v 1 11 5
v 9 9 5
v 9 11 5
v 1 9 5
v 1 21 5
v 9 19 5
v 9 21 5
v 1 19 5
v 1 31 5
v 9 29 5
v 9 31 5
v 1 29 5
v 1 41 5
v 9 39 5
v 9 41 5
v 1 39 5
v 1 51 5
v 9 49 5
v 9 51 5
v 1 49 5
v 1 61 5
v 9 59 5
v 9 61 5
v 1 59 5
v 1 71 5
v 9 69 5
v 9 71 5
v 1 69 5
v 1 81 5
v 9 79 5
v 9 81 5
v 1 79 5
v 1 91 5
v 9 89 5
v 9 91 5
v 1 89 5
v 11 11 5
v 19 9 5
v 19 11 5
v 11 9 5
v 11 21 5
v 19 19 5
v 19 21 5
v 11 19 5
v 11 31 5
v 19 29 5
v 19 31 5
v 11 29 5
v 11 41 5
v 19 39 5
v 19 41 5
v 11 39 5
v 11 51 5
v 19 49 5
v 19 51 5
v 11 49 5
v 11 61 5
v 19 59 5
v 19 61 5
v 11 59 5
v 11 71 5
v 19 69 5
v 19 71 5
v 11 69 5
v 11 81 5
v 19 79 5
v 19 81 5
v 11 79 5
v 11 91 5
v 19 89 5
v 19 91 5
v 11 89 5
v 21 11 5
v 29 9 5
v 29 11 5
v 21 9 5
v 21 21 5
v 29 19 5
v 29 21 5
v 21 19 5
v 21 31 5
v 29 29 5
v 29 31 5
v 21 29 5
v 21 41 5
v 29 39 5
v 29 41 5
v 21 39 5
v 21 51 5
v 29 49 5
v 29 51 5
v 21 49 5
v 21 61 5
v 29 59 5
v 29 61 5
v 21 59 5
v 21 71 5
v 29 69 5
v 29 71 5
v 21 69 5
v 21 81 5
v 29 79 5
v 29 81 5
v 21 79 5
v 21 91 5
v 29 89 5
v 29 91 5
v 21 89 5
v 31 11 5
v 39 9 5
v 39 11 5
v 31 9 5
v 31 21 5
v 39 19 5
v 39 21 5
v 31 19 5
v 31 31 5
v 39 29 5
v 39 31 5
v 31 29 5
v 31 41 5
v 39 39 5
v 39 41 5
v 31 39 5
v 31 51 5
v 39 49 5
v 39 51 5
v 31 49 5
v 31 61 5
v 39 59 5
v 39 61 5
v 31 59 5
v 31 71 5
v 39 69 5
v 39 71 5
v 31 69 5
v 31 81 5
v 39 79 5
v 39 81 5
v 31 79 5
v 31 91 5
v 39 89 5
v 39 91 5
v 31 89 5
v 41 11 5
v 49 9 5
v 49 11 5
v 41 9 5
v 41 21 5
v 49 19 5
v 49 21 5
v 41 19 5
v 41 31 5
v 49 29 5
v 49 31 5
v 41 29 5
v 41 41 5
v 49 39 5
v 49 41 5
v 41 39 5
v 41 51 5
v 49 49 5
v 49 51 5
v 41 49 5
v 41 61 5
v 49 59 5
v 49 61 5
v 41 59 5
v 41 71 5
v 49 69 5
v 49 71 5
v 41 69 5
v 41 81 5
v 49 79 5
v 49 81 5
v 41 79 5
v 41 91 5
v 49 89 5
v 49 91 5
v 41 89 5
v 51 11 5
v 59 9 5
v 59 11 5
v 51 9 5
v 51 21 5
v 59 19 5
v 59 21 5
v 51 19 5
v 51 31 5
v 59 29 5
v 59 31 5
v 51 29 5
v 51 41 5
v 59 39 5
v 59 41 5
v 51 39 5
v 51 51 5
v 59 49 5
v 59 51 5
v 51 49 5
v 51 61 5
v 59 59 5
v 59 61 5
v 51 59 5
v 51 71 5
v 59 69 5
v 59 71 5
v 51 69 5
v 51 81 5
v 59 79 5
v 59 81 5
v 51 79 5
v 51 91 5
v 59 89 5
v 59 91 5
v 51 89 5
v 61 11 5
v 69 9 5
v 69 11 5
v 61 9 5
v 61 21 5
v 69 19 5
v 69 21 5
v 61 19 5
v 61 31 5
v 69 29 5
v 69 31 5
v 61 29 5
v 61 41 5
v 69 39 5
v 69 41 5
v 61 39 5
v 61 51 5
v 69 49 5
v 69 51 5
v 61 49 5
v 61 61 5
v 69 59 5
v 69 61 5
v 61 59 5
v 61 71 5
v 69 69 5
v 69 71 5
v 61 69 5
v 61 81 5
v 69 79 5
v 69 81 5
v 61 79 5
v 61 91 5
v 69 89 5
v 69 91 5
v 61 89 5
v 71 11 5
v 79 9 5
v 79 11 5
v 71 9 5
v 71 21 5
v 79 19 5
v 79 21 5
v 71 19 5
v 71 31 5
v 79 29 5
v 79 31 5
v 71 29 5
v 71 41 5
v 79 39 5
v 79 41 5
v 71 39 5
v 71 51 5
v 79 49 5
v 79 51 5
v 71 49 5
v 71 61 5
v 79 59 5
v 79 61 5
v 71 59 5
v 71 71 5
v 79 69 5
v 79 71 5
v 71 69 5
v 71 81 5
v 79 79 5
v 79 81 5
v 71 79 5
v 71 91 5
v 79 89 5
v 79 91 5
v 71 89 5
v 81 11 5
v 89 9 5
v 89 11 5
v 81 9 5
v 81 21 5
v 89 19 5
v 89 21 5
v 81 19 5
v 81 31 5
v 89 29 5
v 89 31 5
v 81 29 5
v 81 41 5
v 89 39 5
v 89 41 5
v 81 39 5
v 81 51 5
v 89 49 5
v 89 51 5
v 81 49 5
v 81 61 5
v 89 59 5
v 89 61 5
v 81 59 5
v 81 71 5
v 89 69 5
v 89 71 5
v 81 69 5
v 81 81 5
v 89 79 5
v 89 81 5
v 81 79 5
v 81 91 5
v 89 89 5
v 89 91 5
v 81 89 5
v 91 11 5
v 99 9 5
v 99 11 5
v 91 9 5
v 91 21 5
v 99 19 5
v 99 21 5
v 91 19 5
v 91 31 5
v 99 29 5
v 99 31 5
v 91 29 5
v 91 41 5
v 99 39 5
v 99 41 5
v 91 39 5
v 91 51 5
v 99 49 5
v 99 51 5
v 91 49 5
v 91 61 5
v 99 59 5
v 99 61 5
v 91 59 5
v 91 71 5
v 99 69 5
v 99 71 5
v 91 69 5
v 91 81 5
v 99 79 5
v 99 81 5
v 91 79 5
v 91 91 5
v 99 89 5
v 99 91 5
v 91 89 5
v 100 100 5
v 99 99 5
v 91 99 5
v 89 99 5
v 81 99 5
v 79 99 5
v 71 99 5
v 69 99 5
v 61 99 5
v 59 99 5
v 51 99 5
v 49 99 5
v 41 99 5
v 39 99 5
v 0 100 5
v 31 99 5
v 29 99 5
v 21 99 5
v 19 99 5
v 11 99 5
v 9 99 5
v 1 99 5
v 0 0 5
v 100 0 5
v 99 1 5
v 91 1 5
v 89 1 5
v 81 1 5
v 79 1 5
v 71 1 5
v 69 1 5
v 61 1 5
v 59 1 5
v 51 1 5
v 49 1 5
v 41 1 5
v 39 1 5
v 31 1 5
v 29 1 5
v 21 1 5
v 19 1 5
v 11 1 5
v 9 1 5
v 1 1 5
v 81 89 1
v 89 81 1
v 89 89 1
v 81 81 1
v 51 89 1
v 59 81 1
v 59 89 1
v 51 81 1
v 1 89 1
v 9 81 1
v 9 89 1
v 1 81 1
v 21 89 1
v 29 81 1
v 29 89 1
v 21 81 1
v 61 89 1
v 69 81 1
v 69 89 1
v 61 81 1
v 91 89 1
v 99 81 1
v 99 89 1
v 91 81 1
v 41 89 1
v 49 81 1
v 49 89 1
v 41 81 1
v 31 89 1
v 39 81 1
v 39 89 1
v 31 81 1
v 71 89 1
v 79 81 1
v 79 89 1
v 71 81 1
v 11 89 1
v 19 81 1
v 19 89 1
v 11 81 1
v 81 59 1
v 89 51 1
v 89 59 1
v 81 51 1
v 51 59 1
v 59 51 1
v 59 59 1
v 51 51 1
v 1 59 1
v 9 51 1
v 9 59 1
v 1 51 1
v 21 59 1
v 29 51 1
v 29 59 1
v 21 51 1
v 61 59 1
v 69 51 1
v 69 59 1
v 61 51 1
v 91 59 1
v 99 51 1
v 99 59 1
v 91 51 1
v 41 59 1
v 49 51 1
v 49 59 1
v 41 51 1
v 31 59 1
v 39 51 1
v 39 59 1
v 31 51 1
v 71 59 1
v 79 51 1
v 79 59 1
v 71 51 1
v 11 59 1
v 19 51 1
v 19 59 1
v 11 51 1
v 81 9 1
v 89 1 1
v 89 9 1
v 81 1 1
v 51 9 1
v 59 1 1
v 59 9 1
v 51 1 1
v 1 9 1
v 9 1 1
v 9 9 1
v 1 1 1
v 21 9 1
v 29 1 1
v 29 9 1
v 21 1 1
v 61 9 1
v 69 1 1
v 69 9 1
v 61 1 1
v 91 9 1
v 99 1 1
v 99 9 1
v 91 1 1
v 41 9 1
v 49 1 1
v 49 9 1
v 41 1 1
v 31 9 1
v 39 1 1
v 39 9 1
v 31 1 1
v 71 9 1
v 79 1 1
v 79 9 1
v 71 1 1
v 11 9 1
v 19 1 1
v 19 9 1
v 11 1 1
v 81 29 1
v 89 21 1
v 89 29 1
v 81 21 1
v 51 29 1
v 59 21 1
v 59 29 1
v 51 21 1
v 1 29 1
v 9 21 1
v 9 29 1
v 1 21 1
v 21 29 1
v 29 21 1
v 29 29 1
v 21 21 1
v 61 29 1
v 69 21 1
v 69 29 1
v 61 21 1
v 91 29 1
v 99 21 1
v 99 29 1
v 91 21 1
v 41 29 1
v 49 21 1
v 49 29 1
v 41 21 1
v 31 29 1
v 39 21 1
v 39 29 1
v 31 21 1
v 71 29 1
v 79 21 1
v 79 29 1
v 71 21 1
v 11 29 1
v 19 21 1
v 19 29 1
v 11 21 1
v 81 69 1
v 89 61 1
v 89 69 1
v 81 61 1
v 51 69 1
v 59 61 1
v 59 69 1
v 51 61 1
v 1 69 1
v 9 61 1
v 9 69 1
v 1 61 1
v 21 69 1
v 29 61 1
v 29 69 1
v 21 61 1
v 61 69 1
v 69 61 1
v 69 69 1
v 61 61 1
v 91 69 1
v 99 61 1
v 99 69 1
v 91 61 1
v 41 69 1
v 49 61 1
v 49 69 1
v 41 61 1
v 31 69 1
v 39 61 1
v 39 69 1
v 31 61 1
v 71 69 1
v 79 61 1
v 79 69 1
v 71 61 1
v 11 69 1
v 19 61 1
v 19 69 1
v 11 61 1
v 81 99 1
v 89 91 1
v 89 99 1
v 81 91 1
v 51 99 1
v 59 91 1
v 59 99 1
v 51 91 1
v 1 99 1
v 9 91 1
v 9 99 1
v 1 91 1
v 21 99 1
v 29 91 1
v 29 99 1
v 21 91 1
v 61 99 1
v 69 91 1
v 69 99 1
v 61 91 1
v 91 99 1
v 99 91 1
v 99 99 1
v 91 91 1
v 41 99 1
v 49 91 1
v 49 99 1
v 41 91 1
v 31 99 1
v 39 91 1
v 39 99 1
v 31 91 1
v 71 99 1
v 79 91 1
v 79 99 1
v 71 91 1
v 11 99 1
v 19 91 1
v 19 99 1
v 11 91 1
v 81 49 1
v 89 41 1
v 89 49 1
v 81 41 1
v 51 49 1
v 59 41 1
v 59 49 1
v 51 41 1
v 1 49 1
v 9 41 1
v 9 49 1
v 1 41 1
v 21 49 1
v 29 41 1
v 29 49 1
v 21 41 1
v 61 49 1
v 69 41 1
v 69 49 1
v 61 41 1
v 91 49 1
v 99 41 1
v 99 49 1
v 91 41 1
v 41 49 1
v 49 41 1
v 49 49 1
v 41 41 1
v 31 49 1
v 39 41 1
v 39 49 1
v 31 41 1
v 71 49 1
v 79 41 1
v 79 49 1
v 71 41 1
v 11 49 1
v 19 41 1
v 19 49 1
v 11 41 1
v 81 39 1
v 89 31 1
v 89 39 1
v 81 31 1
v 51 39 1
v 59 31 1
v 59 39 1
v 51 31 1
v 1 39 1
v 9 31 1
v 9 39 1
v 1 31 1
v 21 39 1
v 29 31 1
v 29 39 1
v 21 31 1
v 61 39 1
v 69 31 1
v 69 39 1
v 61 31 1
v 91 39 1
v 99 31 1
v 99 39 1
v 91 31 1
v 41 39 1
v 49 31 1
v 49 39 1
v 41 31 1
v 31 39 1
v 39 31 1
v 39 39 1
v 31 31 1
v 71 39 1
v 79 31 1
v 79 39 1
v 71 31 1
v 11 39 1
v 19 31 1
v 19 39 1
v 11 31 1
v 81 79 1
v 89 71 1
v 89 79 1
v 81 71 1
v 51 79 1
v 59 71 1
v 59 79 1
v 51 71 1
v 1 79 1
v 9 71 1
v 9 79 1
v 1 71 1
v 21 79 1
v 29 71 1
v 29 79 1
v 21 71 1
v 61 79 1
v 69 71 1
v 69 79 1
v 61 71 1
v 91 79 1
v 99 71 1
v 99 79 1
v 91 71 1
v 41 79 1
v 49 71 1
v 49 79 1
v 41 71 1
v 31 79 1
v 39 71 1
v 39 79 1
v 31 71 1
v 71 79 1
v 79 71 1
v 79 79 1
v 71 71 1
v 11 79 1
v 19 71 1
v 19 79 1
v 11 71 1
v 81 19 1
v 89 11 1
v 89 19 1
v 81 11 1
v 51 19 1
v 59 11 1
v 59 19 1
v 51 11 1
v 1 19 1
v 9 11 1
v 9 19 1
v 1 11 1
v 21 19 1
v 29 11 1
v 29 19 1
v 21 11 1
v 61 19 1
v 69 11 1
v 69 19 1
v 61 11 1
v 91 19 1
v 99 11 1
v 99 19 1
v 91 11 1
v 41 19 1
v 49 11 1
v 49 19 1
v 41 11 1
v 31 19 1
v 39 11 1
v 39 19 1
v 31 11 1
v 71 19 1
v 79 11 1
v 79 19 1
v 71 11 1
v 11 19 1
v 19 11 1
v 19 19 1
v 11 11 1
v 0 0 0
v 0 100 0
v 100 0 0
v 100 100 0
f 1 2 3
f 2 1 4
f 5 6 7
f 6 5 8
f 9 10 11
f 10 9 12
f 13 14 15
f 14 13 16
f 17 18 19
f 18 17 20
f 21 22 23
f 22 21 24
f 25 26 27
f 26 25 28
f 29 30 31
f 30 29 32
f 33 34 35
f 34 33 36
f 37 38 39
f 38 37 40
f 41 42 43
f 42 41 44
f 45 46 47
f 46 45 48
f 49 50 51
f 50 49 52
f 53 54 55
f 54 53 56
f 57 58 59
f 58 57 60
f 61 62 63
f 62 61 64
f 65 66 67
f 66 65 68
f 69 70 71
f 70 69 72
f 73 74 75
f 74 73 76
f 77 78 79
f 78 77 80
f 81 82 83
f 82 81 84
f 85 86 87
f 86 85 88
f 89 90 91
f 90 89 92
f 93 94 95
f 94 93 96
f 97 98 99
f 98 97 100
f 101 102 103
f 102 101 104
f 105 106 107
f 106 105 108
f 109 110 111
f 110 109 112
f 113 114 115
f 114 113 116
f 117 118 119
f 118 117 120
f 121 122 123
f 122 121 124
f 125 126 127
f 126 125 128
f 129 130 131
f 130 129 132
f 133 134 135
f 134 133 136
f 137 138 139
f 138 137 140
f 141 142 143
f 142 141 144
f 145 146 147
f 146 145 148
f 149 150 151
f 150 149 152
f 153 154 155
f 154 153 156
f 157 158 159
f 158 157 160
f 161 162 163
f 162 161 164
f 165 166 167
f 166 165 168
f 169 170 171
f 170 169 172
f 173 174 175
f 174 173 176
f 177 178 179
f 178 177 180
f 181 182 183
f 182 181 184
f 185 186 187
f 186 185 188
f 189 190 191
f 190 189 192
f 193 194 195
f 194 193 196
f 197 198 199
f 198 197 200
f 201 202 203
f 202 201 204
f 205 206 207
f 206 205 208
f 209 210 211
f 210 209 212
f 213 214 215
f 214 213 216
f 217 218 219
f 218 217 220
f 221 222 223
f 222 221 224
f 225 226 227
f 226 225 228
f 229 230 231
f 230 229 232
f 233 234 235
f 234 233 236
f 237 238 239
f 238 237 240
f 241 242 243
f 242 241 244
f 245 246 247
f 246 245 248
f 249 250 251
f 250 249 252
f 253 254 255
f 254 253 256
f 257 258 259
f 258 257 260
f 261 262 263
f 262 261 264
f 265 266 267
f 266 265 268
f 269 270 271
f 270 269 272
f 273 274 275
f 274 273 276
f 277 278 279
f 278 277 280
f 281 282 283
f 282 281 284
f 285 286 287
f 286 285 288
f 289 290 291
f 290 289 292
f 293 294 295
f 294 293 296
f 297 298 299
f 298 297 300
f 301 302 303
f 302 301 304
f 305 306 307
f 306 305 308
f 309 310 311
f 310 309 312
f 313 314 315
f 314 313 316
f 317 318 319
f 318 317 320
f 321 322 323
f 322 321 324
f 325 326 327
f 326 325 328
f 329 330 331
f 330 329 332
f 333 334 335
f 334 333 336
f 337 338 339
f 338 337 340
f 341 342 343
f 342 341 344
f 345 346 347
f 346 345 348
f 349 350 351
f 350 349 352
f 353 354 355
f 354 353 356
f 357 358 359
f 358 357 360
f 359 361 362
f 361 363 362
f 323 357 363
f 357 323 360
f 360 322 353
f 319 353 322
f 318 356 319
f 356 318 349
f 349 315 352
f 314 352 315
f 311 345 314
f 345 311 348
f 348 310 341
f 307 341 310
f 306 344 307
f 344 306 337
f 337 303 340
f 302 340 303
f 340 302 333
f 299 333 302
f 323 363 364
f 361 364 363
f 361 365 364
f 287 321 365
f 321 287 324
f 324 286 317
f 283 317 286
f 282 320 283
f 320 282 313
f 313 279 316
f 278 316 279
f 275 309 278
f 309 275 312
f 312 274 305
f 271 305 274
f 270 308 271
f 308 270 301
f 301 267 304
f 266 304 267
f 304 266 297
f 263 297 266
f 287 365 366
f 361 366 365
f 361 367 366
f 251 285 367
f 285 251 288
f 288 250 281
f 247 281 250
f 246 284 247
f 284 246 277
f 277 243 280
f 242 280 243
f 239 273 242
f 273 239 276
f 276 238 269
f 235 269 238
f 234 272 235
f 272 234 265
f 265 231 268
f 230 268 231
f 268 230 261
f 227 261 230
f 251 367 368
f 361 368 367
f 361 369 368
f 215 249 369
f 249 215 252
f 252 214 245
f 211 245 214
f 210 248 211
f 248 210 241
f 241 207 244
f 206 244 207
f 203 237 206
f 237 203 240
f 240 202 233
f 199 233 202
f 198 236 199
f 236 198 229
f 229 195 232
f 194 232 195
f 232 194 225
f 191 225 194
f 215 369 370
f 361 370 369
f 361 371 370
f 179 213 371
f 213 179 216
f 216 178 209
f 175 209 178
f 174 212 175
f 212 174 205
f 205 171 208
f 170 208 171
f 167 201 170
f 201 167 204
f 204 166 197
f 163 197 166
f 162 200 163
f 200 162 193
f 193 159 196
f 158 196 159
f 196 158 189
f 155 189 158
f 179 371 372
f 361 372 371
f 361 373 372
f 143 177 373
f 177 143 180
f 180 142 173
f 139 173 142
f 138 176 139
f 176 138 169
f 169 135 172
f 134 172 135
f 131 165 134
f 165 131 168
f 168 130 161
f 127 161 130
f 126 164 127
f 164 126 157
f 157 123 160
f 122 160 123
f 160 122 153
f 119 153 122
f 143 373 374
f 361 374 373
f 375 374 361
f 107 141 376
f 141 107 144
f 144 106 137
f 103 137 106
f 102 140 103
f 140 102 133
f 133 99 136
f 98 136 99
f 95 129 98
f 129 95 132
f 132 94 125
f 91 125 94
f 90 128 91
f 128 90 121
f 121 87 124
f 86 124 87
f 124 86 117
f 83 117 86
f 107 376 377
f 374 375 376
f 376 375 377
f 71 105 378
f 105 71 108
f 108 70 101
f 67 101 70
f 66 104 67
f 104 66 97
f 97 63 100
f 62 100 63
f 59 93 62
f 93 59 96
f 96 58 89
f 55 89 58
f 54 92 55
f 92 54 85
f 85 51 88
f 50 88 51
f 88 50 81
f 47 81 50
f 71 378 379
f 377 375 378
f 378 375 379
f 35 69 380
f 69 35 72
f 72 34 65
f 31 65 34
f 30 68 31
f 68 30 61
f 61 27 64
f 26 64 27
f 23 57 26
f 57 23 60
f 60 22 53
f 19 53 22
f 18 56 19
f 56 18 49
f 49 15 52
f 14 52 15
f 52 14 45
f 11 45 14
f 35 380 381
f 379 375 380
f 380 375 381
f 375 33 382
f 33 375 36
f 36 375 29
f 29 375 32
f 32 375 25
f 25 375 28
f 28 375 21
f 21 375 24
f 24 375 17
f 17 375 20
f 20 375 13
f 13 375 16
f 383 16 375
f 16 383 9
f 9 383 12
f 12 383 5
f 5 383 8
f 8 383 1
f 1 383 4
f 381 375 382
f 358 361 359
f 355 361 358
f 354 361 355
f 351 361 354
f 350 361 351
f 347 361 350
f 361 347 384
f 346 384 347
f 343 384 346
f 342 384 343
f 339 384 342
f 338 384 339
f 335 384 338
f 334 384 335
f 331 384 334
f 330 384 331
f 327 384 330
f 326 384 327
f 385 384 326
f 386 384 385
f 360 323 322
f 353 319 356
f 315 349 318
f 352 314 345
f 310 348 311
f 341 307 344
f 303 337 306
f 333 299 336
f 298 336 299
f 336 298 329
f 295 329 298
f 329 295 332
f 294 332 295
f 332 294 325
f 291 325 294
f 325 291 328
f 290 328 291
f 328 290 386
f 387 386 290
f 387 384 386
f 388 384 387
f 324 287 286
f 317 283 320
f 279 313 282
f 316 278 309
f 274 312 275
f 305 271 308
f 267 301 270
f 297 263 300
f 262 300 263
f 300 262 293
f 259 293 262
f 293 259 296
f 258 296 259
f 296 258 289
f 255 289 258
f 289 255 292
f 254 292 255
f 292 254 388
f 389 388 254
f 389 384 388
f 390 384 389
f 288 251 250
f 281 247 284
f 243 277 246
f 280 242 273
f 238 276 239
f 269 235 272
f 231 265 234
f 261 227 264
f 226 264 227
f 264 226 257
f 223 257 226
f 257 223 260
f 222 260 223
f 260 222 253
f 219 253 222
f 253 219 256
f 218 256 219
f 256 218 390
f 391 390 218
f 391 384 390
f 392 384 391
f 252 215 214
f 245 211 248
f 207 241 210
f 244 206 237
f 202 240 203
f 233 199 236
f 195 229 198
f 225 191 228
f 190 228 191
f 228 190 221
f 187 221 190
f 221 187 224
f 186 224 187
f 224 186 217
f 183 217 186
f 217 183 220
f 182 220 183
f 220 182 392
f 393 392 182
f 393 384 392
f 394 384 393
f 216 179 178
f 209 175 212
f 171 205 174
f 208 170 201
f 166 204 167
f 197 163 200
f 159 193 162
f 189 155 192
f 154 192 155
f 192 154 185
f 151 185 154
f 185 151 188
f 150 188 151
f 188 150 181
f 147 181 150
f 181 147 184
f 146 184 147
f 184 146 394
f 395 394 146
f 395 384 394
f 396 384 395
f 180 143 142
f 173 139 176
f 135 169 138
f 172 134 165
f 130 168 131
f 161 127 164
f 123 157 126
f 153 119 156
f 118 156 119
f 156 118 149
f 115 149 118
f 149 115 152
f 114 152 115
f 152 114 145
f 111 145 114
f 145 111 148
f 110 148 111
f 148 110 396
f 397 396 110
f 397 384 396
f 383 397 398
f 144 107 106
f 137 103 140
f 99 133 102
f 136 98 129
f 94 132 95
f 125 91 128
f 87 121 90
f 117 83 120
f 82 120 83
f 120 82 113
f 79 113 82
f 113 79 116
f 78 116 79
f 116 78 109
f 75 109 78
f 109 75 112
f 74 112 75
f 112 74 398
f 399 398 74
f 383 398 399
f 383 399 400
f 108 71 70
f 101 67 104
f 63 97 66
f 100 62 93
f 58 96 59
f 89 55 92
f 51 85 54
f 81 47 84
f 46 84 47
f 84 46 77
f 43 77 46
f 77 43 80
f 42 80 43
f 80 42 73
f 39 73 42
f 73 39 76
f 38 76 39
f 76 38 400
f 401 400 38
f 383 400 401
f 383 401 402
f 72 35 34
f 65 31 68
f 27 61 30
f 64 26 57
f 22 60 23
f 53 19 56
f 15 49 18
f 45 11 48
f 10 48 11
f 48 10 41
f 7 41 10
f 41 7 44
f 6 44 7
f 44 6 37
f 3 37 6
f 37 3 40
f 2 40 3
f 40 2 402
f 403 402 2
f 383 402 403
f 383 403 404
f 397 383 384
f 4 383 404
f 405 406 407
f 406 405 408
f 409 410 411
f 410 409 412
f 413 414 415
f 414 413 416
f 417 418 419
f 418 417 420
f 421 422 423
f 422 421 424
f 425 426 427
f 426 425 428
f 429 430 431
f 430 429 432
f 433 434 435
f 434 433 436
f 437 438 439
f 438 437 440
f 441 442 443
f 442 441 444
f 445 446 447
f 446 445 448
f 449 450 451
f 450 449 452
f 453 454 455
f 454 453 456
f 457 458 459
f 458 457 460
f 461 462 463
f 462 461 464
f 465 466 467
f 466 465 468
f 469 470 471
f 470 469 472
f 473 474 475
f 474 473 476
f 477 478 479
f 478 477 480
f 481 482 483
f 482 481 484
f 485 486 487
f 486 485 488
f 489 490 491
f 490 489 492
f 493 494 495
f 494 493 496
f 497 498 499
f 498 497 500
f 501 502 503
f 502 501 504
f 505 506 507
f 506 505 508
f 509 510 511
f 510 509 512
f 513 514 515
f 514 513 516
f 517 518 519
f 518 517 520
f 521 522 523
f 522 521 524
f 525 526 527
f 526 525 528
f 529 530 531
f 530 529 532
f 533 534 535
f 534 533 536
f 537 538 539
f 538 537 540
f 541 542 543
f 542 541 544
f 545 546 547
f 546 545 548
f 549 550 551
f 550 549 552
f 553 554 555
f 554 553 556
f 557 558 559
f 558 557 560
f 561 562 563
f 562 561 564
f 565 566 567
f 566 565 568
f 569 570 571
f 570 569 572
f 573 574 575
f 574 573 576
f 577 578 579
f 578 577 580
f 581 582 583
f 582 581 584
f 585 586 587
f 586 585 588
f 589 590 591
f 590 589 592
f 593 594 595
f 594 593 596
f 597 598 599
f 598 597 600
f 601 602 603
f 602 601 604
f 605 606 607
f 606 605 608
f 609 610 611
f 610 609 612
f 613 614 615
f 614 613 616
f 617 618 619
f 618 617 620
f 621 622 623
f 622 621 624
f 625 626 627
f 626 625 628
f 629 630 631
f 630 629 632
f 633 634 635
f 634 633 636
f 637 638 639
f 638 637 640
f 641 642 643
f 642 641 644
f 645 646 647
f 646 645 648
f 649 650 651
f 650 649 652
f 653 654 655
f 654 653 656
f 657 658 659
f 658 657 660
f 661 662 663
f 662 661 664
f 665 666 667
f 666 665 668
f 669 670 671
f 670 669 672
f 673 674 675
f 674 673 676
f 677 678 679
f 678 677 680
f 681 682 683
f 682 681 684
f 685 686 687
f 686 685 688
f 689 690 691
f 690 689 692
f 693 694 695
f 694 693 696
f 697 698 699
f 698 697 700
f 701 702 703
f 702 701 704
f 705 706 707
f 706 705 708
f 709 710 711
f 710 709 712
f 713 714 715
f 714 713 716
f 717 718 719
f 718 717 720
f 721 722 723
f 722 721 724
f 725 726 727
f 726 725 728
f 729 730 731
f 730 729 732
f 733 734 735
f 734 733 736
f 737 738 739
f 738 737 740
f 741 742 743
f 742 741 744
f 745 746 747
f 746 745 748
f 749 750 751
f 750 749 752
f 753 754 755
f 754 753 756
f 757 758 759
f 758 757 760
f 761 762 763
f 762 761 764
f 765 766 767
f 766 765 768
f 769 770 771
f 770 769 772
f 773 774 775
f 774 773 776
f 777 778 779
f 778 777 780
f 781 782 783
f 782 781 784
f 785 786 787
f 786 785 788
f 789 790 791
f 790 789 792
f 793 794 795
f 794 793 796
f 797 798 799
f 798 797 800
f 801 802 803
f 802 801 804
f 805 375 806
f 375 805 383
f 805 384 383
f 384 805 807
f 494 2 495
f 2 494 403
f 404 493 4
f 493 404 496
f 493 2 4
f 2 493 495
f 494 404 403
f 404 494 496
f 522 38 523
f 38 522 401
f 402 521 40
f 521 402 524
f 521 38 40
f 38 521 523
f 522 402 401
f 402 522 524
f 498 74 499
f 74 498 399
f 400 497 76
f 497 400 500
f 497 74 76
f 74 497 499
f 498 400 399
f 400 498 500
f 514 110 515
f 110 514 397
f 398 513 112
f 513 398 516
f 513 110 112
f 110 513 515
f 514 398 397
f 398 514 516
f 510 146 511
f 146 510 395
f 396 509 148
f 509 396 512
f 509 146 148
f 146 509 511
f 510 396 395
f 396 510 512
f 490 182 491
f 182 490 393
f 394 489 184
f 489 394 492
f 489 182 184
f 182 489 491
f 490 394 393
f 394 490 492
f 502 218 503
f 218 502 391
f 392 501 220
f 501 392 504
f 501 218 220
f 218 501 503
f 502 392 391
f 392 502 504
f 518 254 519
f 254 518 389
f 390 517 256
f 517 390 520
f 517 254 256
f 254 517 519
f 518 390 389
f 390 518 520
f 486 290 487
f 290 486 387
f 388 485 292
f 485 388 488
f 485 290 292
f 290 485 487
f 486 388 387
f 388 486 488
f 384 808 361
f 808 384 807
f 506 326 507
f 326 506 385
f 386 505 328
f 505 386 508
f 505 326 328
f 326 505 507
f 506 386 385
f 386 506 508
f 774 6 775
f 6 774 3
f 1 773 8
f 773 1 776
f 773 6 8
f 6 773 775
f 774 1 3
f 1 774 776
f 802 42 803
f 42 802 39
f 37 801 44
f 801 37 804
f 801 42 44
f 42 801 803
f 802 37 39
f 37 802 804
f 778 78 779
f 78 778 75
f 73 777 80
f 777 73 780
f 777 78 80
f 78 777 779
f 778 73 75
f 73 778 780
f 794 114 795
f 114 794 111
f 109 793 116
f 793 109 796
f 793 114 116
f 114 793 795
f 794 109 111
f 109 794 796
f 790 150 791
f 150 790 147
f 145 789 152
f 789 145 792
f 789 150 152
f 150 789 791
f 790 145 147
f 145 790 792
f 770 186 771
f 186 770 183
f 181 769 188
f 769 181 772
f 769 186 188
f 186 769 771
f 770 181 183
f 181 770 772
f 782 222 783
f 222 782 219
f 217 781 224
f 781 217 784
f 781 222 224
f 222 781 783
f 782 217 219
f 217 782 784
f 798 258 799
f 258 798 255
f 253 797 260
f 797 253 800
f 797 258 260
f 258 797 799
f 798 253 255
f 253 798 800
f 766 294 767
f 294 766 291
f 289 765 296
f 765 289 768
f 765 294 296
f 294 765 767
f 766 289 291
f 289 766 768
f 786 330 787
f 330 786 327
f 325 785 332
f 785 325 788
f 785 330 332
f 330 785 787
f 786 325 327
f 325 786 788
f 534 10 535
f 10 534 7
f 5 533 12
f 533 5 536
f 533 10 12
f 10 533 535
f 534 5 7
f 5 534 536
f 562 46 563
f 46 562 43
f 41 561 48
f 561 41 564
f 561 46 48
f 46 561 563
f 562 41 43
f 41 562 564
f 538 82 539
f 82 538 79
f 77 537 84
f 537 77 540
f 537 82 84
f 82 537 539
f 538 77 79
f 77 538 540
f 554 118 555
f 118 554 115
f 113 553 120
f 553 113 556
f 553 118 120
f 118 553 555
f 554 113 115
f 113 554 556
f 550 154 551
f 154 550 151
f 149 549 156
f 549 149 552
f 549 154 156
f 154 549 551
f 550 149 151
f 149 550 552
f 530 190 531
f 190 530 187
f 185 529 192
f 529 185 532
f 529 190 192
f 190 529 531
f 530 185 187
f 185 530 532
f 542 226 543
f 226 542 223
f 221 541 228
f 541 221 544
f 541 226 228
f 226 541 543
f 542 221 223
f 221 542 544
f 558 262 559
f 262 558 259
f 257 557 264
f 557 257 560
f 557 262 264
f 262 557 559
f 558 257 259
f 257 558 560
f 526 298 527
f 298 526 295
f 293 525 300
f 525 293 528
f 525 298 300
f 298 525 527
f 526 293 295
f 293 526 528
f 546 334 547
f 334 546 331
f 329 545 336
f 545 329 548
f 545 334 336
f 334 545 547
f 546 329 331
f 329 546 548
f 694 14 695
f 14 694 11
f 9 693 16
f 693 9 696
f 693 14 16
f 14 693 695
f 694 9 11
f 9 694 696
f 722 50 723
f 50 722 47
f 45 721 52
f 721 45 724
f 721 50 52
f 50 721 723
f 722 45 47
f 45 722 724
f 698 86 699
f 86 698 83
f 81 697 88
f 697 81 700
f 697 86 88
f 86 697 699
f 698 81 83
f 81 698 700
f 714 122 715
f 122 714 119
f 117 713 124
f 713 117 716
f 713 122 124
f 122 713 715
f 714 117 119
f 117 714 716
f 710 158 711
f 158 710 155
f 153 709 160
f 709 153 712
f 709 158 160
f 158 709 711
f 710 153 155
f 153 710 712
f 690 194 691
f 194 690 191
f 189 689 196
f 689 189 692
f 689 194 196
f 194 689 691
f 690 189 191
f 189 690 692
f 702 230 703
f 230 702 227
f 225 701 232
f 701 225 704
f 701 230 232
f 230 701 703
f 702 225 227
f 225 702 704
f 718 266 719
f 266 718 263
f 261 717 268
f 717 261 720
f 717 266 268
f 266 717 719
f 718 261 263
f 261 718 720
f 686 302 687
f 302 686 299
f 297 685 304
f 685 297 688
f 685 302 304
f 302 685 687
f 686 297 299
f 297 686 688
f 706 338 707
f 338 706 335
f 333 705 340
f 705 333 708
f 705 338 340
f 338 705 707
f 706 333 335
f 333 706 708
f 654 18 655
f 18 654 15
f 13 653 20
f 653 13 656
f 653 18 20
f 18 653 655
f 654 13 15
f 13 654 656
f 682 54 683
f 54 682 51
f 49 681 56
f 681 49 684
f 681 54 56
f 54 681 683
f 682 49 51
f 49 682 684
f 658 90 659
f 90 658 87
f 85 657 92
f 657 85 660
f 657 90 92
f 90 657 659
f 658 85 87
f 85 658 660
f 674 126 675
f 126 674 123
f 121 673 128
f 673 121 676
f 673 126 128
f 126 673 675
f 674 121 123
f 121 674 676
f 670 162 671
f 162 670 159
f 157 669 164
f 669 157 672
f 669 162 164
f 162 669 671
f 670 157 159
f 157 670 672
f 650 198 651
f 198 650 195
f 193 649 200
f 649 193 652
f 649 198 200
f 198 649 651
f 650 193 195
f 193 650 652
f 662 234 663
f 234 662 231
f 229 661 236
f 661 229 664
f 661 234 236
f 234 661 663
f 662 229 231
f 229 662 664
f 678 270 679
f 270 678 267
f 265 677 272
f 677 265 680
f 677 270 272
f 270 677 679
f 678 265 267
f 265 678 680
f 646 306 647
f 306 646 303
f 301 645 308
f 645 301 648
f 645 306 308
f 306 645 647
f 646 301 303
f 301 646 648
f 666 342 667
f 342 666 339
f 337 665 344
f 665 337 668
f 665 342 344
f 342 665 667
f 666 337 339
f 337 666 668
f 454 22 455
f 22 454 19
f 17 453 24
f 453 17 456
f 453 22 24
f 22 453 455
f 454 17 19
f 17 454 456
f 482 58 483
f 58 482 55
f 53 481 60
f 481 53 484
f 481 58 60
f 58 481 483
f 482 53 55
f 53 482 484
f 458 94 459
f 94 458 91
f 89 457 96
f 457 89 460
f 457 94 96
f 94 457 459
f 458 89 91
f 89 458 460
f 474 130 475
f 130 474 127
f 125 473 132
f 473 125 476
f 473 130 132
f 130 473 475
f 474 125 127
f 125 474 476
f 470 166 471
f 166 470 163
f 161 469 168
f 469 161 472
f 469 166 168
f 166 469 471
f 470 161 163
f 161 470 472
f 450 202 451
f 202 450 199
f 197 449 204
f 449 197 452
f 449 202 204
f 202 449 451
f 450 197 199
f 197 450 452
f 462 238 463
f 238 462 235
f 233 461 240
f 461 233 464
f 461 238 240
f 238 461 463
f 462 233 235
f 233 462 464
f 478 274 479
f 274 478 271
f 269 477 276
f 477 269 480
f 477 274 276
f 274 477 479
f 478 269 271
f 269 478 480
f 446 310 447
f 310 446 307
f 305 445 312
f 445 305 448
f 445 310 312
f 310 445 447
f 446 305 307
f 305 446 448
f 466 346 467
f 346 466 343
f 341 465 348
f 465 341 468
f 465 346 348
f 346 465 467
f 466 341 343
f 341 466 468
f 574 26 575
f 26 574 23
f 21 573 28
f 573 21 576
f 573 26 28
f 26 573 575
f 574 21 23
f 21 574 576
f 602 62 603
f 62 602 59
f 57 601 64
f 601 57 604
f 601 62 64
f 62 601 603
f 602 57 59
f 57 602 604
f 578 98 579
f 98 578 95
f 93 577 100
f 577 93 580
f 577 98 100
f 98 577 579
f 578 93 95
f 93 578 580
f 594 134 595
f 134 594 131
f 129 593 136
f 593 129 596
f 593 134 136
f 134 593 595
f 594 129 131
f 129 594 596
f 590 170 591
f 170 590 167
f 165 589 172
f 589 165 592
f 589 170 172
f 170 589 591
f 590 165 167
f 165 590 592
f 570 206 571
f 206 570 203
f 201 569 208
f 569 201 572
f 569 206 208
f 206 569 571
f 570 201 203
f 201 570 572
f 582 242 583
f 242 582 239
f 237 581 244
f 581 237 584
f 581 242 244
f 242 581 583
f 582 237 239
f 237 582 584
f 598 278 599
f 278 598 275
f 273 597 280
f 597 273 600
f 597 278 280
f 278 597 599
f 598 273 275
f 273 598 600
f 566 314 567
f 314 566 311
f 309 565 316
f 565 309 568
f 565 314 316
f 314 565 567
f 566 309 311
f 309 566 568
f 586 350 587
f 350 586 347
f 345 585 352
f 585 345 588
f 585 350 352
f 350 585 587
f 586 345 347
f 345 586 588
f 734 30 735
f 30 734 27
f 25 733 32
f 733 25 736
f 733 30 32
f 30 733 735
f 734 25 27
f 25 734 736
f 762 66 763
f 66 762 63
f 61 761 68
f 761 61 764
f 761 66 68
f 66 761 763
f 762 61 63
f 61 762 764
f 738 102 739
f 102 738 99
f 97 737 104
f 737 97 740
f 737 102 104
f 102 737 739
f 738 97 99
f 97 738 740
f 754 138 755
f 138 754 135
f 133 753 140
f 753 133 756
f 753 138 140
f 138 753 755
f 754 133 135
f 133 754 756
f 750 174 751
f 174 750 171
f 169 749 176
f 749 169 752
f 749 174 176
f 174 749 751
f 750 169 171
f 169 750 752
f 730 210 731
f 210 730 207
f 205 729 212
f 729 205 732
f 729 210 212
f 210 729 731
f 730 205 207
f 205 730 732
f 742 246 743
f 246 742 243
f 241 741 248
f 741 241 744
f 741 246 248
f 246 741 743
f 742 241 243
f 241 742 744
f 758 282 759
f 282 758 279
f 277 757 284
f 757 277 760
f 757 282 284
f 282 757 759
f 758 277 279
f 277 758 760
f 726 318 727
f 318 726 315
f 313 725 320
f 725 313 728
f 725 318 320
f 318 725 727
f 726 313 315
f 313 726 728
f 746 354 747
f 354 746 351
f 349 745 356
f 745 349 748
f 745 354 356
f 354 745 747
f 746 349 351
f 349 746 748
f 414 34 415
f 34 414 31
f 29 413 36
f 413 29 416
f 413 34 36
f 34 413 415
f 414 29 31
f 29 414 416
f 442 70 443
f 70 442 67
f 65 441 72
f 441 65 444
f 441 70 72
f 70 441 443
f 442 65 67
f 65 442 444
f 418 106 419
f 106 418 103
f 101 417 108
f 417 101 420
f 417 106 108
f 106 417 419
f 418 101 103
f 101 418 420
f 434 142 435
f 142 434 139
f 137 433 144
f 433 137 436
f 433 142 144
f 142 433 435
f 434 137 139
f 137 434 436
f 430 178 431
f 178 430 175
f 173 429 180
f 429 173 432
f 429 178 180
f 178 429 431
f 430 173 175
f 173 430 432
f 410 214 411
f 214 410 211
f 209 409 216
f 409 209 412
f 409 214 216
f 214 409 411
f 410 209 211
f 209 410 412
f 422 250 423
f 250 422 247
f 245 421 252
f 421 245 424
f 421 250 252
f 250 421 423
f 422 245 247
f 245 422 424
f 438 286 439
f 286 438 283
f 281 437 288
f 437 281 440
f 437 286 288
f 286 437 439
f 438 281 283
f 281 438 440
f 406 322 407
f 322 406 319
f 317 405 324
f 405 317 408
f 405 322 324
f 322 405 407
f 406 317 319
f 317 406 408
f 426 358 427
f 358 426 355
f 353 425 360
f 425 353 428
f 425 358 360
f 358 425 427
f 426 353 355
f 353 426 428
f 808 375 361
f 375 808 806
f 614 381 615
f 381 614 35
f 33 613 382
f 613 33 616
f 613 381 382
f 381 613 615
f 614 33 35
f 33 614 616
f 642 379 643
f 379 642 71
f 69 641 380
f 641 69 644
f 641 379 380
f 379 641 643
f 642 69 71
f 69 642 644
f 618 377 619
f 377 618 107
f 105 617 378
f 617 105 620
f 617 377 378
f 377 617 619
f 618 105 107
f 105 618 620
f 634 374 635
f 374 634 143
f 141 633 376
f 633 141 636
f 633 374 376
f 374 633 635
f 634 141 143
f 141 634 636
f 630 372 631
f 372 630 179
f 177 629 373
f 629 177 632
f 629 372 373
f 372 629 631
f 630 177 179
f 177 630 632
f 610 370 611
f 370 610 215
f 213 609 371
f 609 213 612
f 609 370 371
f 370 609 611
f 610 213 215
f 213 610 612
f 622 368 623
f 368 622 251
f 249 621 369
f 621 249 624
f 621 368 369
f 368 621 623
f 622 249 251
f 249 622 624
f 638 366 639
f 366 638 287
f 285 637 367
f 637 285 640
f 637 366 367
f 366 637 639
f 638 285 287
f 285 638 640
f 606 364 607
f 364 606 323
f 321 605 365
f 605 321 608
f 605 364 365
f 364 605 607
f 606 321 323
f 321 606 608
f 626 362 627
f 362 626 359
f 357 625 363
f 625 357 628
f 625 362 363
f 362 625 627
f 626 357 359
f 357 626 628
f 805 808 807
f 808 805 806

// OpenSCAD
/*
————————————————————————————————————————————————————————————————————————————————
CONFIG
————————————————————————————————————————————————————————————————————————————————
*/
$fn=360 / 10;

Outer_shell_width = 100;
Outer_shell_length = 100;
Outer_shell_height = 5;

Min_floor_height = 1;

Modules = [10, 10]; // cols, rows

Hang_depth_height = -7.5; // negative = hole depth, positive = pin height. 
Hang_diameter = 8;
Hang_faces = 4;
Hang_rotation = 0; // 360 / 4 / 2;

Rendering_transp = 0.9;




/*
————————————————————————————————————————————————————————————————————————————————
MODULES
————————————————————————————————————————————————————————————————————————————————
*/
module start(){
	echo("Script start");
	
	color("red", Rendering_transp)  cube([ // floor
		Outer_shell_width,
		Outer_shell_length,
		Min_floor_height
	]);

	unit_dimensions = [
		Outer_shell_width / Modules[1],
		Outer_shell_length / Modules[0],
		Outer_shell_height - Min_floor_height
	];


	translate([0, 0, Min_floor_height]){ // move up for bottom safe area
		for (
			unit_row_index = [1 : Modules[0]]
		){
			for (
				unit_column_index = [1 : Modules[1]]
			){
				translate([
					(unit_column_index - 1) * unit_dimensions[0],
					(unit_row_index - 1) * unit_dimensions[1],
					0
				]){
					unit(unit_dimensions);
				}
			}
		}
	}

	echo("Script end");
}


module unit(unit_dimensions) {
	if( Hang_depth_height > 0 ){
		union(){
			unit_shell(unit_dimensions);
			hanger(Hang_depth_height, Hang_diameter, unit_dimensions);
		};
	}else{
		difference(){
			unit_shell(unit_dimensions);
			hanger(Hang_depth_height, Hang_diameter, unit_dimensions);
		};
	}
}


module unit_shell(unit_dimensions) {
	color("orange", Rendering_transp) cube(unit_dimensions); // module unit
}


module hanger(Hang_depth_height, diameter, unit_dimensions) {
	translate([
		unit_dimensions[0] / 2,
		unit_dimensions[1] / 2,
		unit_dimensions[2] + (
			Hang_depth_height > 0 ? 0 : Hang_depth_height
		)
	]){
		rotate([
			0 , 0 , Hang_rotation
		]){
			if( Hang_faces == 4 ) {
				translate([
					( diameter / 2 ) * -1,
					( diameter / 2 ) * -1,
					0
				]){
					color("blue", Rendering_transp) cube( // hangers
						size = [
							diameter,
							diameter,
							abs(Hang_depth_height)
						],
						center = false
					);
				};
			} else {
				color("yellow", Rendering_transp) cylinder( // hangers
					h = abs(Hang_depth_height), 
					r1 = diameter / 2, 
					r2 = diameter / 2, 
					center = false,
					$fn = Hang_faces
				);
			}
		}
	}
}




/*
————————————————————————————————————————————————————————————————————————————————
BOOTSTRAP
————————————————————————————————————————————————————————————————————————————————
*/
start();
